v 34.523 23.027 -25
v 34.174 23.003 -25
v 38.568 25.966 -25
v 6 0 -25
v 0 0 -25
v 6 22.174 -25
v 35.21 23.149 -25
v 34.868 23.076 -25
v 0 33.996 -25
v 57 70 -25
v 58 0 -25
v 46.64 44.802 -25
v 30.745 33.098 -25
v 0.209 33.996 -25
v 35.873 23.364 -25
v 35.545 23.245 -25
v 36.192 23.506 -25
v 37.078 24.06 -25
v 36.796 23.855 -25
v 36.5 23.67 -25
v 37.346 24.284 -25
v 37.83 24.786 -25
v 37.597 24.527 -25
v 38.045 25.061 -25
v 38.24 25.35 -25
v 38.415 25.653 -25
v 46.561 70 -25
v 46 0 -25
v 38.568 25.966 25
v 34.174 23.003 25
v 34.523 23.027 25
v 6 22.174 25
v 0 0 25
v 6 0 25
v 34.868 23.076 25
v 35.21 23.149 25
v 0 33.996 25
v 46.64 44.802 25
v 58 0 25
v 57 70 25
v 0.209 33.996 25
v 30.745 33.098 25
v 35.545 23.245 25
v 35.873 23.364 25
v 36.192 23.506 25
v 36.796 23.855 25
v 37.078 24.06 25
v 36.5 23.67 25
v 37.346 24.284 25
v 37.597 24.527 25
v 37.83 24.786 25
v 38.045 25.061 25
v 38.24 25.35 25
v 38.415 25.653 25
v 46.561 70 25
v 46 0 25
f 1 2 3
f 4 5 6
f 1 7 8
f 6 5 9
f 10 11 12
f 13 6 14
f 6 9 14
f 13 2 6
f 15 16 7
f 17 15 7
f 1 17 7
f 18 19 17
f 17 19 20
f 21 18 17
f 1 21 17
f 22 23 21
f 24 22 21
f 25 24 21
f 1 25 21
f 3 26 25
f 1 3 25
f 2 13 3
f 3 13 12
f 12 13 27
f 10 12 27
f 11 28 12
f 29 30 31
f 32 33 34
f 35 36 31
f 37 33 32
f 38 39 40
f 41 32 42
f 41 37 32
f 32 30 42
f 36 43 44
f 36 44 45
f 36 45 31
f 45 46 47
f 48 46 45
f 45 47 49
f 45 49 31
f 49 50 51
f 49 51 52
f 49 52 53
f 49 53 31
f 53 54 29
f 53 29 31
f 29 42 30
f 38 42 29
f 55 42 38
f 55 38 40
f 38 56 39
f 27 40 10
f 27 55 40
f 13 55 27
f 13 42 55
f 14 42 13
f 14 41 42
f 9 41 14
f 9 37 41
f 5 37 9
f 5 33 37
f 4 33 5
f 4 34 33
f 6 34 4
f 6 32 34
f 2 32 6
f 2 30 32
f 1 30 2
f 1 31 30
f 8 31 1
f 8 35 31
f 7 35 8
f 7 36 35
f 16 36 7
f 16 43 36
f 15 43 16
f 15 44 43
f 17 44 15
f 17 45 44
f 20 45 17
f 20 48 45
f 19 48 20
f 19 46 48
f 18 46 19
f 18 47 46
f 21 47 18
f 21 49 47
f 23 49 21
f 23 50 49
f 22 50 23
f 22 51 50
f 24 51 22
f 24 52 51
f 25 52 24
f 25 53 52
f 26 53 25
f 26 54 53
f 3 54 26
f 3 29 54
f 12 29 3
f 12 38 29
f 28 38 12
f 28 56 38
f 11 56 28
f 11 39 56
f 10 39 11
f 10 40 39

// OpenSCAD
// Monobloc toy chair with a continuous curved seat/back and 3 cm base height.

chair_width = 50;
chair_depth = 60;
chair_height = 70;
seat_height = 28;
seat_depth = 34;
back_x = 52;
profile_radius = 6;
$fn = 90;

profile_points = [
  [0, 0],
  [0, seat_height],
  [seat_depth, seat_height],
  [back_x, chair_height],
  [back_x, 0]
];

profile_radii = [
  profile_radius,
  profile_radius,
  profile_radius - 1,
  profile_radius - 1,
  profile_radius
];

module chair_profile_2d() {
  intersection() {
    union() {
      for (i = [0 : len(profile_points) - 2])
        hull() {
          translate(profile_points[i])
            circle(r = profile_radii[i]);
          translate(profile_points[i + 1])
            circle(r = profile_radii[i + 1]);
        }
    }
    square([chair_depth, chair_height], center = false);
  }
}

linear_extrude(height = chair_width, center = true)
  chair_profile_2d();
